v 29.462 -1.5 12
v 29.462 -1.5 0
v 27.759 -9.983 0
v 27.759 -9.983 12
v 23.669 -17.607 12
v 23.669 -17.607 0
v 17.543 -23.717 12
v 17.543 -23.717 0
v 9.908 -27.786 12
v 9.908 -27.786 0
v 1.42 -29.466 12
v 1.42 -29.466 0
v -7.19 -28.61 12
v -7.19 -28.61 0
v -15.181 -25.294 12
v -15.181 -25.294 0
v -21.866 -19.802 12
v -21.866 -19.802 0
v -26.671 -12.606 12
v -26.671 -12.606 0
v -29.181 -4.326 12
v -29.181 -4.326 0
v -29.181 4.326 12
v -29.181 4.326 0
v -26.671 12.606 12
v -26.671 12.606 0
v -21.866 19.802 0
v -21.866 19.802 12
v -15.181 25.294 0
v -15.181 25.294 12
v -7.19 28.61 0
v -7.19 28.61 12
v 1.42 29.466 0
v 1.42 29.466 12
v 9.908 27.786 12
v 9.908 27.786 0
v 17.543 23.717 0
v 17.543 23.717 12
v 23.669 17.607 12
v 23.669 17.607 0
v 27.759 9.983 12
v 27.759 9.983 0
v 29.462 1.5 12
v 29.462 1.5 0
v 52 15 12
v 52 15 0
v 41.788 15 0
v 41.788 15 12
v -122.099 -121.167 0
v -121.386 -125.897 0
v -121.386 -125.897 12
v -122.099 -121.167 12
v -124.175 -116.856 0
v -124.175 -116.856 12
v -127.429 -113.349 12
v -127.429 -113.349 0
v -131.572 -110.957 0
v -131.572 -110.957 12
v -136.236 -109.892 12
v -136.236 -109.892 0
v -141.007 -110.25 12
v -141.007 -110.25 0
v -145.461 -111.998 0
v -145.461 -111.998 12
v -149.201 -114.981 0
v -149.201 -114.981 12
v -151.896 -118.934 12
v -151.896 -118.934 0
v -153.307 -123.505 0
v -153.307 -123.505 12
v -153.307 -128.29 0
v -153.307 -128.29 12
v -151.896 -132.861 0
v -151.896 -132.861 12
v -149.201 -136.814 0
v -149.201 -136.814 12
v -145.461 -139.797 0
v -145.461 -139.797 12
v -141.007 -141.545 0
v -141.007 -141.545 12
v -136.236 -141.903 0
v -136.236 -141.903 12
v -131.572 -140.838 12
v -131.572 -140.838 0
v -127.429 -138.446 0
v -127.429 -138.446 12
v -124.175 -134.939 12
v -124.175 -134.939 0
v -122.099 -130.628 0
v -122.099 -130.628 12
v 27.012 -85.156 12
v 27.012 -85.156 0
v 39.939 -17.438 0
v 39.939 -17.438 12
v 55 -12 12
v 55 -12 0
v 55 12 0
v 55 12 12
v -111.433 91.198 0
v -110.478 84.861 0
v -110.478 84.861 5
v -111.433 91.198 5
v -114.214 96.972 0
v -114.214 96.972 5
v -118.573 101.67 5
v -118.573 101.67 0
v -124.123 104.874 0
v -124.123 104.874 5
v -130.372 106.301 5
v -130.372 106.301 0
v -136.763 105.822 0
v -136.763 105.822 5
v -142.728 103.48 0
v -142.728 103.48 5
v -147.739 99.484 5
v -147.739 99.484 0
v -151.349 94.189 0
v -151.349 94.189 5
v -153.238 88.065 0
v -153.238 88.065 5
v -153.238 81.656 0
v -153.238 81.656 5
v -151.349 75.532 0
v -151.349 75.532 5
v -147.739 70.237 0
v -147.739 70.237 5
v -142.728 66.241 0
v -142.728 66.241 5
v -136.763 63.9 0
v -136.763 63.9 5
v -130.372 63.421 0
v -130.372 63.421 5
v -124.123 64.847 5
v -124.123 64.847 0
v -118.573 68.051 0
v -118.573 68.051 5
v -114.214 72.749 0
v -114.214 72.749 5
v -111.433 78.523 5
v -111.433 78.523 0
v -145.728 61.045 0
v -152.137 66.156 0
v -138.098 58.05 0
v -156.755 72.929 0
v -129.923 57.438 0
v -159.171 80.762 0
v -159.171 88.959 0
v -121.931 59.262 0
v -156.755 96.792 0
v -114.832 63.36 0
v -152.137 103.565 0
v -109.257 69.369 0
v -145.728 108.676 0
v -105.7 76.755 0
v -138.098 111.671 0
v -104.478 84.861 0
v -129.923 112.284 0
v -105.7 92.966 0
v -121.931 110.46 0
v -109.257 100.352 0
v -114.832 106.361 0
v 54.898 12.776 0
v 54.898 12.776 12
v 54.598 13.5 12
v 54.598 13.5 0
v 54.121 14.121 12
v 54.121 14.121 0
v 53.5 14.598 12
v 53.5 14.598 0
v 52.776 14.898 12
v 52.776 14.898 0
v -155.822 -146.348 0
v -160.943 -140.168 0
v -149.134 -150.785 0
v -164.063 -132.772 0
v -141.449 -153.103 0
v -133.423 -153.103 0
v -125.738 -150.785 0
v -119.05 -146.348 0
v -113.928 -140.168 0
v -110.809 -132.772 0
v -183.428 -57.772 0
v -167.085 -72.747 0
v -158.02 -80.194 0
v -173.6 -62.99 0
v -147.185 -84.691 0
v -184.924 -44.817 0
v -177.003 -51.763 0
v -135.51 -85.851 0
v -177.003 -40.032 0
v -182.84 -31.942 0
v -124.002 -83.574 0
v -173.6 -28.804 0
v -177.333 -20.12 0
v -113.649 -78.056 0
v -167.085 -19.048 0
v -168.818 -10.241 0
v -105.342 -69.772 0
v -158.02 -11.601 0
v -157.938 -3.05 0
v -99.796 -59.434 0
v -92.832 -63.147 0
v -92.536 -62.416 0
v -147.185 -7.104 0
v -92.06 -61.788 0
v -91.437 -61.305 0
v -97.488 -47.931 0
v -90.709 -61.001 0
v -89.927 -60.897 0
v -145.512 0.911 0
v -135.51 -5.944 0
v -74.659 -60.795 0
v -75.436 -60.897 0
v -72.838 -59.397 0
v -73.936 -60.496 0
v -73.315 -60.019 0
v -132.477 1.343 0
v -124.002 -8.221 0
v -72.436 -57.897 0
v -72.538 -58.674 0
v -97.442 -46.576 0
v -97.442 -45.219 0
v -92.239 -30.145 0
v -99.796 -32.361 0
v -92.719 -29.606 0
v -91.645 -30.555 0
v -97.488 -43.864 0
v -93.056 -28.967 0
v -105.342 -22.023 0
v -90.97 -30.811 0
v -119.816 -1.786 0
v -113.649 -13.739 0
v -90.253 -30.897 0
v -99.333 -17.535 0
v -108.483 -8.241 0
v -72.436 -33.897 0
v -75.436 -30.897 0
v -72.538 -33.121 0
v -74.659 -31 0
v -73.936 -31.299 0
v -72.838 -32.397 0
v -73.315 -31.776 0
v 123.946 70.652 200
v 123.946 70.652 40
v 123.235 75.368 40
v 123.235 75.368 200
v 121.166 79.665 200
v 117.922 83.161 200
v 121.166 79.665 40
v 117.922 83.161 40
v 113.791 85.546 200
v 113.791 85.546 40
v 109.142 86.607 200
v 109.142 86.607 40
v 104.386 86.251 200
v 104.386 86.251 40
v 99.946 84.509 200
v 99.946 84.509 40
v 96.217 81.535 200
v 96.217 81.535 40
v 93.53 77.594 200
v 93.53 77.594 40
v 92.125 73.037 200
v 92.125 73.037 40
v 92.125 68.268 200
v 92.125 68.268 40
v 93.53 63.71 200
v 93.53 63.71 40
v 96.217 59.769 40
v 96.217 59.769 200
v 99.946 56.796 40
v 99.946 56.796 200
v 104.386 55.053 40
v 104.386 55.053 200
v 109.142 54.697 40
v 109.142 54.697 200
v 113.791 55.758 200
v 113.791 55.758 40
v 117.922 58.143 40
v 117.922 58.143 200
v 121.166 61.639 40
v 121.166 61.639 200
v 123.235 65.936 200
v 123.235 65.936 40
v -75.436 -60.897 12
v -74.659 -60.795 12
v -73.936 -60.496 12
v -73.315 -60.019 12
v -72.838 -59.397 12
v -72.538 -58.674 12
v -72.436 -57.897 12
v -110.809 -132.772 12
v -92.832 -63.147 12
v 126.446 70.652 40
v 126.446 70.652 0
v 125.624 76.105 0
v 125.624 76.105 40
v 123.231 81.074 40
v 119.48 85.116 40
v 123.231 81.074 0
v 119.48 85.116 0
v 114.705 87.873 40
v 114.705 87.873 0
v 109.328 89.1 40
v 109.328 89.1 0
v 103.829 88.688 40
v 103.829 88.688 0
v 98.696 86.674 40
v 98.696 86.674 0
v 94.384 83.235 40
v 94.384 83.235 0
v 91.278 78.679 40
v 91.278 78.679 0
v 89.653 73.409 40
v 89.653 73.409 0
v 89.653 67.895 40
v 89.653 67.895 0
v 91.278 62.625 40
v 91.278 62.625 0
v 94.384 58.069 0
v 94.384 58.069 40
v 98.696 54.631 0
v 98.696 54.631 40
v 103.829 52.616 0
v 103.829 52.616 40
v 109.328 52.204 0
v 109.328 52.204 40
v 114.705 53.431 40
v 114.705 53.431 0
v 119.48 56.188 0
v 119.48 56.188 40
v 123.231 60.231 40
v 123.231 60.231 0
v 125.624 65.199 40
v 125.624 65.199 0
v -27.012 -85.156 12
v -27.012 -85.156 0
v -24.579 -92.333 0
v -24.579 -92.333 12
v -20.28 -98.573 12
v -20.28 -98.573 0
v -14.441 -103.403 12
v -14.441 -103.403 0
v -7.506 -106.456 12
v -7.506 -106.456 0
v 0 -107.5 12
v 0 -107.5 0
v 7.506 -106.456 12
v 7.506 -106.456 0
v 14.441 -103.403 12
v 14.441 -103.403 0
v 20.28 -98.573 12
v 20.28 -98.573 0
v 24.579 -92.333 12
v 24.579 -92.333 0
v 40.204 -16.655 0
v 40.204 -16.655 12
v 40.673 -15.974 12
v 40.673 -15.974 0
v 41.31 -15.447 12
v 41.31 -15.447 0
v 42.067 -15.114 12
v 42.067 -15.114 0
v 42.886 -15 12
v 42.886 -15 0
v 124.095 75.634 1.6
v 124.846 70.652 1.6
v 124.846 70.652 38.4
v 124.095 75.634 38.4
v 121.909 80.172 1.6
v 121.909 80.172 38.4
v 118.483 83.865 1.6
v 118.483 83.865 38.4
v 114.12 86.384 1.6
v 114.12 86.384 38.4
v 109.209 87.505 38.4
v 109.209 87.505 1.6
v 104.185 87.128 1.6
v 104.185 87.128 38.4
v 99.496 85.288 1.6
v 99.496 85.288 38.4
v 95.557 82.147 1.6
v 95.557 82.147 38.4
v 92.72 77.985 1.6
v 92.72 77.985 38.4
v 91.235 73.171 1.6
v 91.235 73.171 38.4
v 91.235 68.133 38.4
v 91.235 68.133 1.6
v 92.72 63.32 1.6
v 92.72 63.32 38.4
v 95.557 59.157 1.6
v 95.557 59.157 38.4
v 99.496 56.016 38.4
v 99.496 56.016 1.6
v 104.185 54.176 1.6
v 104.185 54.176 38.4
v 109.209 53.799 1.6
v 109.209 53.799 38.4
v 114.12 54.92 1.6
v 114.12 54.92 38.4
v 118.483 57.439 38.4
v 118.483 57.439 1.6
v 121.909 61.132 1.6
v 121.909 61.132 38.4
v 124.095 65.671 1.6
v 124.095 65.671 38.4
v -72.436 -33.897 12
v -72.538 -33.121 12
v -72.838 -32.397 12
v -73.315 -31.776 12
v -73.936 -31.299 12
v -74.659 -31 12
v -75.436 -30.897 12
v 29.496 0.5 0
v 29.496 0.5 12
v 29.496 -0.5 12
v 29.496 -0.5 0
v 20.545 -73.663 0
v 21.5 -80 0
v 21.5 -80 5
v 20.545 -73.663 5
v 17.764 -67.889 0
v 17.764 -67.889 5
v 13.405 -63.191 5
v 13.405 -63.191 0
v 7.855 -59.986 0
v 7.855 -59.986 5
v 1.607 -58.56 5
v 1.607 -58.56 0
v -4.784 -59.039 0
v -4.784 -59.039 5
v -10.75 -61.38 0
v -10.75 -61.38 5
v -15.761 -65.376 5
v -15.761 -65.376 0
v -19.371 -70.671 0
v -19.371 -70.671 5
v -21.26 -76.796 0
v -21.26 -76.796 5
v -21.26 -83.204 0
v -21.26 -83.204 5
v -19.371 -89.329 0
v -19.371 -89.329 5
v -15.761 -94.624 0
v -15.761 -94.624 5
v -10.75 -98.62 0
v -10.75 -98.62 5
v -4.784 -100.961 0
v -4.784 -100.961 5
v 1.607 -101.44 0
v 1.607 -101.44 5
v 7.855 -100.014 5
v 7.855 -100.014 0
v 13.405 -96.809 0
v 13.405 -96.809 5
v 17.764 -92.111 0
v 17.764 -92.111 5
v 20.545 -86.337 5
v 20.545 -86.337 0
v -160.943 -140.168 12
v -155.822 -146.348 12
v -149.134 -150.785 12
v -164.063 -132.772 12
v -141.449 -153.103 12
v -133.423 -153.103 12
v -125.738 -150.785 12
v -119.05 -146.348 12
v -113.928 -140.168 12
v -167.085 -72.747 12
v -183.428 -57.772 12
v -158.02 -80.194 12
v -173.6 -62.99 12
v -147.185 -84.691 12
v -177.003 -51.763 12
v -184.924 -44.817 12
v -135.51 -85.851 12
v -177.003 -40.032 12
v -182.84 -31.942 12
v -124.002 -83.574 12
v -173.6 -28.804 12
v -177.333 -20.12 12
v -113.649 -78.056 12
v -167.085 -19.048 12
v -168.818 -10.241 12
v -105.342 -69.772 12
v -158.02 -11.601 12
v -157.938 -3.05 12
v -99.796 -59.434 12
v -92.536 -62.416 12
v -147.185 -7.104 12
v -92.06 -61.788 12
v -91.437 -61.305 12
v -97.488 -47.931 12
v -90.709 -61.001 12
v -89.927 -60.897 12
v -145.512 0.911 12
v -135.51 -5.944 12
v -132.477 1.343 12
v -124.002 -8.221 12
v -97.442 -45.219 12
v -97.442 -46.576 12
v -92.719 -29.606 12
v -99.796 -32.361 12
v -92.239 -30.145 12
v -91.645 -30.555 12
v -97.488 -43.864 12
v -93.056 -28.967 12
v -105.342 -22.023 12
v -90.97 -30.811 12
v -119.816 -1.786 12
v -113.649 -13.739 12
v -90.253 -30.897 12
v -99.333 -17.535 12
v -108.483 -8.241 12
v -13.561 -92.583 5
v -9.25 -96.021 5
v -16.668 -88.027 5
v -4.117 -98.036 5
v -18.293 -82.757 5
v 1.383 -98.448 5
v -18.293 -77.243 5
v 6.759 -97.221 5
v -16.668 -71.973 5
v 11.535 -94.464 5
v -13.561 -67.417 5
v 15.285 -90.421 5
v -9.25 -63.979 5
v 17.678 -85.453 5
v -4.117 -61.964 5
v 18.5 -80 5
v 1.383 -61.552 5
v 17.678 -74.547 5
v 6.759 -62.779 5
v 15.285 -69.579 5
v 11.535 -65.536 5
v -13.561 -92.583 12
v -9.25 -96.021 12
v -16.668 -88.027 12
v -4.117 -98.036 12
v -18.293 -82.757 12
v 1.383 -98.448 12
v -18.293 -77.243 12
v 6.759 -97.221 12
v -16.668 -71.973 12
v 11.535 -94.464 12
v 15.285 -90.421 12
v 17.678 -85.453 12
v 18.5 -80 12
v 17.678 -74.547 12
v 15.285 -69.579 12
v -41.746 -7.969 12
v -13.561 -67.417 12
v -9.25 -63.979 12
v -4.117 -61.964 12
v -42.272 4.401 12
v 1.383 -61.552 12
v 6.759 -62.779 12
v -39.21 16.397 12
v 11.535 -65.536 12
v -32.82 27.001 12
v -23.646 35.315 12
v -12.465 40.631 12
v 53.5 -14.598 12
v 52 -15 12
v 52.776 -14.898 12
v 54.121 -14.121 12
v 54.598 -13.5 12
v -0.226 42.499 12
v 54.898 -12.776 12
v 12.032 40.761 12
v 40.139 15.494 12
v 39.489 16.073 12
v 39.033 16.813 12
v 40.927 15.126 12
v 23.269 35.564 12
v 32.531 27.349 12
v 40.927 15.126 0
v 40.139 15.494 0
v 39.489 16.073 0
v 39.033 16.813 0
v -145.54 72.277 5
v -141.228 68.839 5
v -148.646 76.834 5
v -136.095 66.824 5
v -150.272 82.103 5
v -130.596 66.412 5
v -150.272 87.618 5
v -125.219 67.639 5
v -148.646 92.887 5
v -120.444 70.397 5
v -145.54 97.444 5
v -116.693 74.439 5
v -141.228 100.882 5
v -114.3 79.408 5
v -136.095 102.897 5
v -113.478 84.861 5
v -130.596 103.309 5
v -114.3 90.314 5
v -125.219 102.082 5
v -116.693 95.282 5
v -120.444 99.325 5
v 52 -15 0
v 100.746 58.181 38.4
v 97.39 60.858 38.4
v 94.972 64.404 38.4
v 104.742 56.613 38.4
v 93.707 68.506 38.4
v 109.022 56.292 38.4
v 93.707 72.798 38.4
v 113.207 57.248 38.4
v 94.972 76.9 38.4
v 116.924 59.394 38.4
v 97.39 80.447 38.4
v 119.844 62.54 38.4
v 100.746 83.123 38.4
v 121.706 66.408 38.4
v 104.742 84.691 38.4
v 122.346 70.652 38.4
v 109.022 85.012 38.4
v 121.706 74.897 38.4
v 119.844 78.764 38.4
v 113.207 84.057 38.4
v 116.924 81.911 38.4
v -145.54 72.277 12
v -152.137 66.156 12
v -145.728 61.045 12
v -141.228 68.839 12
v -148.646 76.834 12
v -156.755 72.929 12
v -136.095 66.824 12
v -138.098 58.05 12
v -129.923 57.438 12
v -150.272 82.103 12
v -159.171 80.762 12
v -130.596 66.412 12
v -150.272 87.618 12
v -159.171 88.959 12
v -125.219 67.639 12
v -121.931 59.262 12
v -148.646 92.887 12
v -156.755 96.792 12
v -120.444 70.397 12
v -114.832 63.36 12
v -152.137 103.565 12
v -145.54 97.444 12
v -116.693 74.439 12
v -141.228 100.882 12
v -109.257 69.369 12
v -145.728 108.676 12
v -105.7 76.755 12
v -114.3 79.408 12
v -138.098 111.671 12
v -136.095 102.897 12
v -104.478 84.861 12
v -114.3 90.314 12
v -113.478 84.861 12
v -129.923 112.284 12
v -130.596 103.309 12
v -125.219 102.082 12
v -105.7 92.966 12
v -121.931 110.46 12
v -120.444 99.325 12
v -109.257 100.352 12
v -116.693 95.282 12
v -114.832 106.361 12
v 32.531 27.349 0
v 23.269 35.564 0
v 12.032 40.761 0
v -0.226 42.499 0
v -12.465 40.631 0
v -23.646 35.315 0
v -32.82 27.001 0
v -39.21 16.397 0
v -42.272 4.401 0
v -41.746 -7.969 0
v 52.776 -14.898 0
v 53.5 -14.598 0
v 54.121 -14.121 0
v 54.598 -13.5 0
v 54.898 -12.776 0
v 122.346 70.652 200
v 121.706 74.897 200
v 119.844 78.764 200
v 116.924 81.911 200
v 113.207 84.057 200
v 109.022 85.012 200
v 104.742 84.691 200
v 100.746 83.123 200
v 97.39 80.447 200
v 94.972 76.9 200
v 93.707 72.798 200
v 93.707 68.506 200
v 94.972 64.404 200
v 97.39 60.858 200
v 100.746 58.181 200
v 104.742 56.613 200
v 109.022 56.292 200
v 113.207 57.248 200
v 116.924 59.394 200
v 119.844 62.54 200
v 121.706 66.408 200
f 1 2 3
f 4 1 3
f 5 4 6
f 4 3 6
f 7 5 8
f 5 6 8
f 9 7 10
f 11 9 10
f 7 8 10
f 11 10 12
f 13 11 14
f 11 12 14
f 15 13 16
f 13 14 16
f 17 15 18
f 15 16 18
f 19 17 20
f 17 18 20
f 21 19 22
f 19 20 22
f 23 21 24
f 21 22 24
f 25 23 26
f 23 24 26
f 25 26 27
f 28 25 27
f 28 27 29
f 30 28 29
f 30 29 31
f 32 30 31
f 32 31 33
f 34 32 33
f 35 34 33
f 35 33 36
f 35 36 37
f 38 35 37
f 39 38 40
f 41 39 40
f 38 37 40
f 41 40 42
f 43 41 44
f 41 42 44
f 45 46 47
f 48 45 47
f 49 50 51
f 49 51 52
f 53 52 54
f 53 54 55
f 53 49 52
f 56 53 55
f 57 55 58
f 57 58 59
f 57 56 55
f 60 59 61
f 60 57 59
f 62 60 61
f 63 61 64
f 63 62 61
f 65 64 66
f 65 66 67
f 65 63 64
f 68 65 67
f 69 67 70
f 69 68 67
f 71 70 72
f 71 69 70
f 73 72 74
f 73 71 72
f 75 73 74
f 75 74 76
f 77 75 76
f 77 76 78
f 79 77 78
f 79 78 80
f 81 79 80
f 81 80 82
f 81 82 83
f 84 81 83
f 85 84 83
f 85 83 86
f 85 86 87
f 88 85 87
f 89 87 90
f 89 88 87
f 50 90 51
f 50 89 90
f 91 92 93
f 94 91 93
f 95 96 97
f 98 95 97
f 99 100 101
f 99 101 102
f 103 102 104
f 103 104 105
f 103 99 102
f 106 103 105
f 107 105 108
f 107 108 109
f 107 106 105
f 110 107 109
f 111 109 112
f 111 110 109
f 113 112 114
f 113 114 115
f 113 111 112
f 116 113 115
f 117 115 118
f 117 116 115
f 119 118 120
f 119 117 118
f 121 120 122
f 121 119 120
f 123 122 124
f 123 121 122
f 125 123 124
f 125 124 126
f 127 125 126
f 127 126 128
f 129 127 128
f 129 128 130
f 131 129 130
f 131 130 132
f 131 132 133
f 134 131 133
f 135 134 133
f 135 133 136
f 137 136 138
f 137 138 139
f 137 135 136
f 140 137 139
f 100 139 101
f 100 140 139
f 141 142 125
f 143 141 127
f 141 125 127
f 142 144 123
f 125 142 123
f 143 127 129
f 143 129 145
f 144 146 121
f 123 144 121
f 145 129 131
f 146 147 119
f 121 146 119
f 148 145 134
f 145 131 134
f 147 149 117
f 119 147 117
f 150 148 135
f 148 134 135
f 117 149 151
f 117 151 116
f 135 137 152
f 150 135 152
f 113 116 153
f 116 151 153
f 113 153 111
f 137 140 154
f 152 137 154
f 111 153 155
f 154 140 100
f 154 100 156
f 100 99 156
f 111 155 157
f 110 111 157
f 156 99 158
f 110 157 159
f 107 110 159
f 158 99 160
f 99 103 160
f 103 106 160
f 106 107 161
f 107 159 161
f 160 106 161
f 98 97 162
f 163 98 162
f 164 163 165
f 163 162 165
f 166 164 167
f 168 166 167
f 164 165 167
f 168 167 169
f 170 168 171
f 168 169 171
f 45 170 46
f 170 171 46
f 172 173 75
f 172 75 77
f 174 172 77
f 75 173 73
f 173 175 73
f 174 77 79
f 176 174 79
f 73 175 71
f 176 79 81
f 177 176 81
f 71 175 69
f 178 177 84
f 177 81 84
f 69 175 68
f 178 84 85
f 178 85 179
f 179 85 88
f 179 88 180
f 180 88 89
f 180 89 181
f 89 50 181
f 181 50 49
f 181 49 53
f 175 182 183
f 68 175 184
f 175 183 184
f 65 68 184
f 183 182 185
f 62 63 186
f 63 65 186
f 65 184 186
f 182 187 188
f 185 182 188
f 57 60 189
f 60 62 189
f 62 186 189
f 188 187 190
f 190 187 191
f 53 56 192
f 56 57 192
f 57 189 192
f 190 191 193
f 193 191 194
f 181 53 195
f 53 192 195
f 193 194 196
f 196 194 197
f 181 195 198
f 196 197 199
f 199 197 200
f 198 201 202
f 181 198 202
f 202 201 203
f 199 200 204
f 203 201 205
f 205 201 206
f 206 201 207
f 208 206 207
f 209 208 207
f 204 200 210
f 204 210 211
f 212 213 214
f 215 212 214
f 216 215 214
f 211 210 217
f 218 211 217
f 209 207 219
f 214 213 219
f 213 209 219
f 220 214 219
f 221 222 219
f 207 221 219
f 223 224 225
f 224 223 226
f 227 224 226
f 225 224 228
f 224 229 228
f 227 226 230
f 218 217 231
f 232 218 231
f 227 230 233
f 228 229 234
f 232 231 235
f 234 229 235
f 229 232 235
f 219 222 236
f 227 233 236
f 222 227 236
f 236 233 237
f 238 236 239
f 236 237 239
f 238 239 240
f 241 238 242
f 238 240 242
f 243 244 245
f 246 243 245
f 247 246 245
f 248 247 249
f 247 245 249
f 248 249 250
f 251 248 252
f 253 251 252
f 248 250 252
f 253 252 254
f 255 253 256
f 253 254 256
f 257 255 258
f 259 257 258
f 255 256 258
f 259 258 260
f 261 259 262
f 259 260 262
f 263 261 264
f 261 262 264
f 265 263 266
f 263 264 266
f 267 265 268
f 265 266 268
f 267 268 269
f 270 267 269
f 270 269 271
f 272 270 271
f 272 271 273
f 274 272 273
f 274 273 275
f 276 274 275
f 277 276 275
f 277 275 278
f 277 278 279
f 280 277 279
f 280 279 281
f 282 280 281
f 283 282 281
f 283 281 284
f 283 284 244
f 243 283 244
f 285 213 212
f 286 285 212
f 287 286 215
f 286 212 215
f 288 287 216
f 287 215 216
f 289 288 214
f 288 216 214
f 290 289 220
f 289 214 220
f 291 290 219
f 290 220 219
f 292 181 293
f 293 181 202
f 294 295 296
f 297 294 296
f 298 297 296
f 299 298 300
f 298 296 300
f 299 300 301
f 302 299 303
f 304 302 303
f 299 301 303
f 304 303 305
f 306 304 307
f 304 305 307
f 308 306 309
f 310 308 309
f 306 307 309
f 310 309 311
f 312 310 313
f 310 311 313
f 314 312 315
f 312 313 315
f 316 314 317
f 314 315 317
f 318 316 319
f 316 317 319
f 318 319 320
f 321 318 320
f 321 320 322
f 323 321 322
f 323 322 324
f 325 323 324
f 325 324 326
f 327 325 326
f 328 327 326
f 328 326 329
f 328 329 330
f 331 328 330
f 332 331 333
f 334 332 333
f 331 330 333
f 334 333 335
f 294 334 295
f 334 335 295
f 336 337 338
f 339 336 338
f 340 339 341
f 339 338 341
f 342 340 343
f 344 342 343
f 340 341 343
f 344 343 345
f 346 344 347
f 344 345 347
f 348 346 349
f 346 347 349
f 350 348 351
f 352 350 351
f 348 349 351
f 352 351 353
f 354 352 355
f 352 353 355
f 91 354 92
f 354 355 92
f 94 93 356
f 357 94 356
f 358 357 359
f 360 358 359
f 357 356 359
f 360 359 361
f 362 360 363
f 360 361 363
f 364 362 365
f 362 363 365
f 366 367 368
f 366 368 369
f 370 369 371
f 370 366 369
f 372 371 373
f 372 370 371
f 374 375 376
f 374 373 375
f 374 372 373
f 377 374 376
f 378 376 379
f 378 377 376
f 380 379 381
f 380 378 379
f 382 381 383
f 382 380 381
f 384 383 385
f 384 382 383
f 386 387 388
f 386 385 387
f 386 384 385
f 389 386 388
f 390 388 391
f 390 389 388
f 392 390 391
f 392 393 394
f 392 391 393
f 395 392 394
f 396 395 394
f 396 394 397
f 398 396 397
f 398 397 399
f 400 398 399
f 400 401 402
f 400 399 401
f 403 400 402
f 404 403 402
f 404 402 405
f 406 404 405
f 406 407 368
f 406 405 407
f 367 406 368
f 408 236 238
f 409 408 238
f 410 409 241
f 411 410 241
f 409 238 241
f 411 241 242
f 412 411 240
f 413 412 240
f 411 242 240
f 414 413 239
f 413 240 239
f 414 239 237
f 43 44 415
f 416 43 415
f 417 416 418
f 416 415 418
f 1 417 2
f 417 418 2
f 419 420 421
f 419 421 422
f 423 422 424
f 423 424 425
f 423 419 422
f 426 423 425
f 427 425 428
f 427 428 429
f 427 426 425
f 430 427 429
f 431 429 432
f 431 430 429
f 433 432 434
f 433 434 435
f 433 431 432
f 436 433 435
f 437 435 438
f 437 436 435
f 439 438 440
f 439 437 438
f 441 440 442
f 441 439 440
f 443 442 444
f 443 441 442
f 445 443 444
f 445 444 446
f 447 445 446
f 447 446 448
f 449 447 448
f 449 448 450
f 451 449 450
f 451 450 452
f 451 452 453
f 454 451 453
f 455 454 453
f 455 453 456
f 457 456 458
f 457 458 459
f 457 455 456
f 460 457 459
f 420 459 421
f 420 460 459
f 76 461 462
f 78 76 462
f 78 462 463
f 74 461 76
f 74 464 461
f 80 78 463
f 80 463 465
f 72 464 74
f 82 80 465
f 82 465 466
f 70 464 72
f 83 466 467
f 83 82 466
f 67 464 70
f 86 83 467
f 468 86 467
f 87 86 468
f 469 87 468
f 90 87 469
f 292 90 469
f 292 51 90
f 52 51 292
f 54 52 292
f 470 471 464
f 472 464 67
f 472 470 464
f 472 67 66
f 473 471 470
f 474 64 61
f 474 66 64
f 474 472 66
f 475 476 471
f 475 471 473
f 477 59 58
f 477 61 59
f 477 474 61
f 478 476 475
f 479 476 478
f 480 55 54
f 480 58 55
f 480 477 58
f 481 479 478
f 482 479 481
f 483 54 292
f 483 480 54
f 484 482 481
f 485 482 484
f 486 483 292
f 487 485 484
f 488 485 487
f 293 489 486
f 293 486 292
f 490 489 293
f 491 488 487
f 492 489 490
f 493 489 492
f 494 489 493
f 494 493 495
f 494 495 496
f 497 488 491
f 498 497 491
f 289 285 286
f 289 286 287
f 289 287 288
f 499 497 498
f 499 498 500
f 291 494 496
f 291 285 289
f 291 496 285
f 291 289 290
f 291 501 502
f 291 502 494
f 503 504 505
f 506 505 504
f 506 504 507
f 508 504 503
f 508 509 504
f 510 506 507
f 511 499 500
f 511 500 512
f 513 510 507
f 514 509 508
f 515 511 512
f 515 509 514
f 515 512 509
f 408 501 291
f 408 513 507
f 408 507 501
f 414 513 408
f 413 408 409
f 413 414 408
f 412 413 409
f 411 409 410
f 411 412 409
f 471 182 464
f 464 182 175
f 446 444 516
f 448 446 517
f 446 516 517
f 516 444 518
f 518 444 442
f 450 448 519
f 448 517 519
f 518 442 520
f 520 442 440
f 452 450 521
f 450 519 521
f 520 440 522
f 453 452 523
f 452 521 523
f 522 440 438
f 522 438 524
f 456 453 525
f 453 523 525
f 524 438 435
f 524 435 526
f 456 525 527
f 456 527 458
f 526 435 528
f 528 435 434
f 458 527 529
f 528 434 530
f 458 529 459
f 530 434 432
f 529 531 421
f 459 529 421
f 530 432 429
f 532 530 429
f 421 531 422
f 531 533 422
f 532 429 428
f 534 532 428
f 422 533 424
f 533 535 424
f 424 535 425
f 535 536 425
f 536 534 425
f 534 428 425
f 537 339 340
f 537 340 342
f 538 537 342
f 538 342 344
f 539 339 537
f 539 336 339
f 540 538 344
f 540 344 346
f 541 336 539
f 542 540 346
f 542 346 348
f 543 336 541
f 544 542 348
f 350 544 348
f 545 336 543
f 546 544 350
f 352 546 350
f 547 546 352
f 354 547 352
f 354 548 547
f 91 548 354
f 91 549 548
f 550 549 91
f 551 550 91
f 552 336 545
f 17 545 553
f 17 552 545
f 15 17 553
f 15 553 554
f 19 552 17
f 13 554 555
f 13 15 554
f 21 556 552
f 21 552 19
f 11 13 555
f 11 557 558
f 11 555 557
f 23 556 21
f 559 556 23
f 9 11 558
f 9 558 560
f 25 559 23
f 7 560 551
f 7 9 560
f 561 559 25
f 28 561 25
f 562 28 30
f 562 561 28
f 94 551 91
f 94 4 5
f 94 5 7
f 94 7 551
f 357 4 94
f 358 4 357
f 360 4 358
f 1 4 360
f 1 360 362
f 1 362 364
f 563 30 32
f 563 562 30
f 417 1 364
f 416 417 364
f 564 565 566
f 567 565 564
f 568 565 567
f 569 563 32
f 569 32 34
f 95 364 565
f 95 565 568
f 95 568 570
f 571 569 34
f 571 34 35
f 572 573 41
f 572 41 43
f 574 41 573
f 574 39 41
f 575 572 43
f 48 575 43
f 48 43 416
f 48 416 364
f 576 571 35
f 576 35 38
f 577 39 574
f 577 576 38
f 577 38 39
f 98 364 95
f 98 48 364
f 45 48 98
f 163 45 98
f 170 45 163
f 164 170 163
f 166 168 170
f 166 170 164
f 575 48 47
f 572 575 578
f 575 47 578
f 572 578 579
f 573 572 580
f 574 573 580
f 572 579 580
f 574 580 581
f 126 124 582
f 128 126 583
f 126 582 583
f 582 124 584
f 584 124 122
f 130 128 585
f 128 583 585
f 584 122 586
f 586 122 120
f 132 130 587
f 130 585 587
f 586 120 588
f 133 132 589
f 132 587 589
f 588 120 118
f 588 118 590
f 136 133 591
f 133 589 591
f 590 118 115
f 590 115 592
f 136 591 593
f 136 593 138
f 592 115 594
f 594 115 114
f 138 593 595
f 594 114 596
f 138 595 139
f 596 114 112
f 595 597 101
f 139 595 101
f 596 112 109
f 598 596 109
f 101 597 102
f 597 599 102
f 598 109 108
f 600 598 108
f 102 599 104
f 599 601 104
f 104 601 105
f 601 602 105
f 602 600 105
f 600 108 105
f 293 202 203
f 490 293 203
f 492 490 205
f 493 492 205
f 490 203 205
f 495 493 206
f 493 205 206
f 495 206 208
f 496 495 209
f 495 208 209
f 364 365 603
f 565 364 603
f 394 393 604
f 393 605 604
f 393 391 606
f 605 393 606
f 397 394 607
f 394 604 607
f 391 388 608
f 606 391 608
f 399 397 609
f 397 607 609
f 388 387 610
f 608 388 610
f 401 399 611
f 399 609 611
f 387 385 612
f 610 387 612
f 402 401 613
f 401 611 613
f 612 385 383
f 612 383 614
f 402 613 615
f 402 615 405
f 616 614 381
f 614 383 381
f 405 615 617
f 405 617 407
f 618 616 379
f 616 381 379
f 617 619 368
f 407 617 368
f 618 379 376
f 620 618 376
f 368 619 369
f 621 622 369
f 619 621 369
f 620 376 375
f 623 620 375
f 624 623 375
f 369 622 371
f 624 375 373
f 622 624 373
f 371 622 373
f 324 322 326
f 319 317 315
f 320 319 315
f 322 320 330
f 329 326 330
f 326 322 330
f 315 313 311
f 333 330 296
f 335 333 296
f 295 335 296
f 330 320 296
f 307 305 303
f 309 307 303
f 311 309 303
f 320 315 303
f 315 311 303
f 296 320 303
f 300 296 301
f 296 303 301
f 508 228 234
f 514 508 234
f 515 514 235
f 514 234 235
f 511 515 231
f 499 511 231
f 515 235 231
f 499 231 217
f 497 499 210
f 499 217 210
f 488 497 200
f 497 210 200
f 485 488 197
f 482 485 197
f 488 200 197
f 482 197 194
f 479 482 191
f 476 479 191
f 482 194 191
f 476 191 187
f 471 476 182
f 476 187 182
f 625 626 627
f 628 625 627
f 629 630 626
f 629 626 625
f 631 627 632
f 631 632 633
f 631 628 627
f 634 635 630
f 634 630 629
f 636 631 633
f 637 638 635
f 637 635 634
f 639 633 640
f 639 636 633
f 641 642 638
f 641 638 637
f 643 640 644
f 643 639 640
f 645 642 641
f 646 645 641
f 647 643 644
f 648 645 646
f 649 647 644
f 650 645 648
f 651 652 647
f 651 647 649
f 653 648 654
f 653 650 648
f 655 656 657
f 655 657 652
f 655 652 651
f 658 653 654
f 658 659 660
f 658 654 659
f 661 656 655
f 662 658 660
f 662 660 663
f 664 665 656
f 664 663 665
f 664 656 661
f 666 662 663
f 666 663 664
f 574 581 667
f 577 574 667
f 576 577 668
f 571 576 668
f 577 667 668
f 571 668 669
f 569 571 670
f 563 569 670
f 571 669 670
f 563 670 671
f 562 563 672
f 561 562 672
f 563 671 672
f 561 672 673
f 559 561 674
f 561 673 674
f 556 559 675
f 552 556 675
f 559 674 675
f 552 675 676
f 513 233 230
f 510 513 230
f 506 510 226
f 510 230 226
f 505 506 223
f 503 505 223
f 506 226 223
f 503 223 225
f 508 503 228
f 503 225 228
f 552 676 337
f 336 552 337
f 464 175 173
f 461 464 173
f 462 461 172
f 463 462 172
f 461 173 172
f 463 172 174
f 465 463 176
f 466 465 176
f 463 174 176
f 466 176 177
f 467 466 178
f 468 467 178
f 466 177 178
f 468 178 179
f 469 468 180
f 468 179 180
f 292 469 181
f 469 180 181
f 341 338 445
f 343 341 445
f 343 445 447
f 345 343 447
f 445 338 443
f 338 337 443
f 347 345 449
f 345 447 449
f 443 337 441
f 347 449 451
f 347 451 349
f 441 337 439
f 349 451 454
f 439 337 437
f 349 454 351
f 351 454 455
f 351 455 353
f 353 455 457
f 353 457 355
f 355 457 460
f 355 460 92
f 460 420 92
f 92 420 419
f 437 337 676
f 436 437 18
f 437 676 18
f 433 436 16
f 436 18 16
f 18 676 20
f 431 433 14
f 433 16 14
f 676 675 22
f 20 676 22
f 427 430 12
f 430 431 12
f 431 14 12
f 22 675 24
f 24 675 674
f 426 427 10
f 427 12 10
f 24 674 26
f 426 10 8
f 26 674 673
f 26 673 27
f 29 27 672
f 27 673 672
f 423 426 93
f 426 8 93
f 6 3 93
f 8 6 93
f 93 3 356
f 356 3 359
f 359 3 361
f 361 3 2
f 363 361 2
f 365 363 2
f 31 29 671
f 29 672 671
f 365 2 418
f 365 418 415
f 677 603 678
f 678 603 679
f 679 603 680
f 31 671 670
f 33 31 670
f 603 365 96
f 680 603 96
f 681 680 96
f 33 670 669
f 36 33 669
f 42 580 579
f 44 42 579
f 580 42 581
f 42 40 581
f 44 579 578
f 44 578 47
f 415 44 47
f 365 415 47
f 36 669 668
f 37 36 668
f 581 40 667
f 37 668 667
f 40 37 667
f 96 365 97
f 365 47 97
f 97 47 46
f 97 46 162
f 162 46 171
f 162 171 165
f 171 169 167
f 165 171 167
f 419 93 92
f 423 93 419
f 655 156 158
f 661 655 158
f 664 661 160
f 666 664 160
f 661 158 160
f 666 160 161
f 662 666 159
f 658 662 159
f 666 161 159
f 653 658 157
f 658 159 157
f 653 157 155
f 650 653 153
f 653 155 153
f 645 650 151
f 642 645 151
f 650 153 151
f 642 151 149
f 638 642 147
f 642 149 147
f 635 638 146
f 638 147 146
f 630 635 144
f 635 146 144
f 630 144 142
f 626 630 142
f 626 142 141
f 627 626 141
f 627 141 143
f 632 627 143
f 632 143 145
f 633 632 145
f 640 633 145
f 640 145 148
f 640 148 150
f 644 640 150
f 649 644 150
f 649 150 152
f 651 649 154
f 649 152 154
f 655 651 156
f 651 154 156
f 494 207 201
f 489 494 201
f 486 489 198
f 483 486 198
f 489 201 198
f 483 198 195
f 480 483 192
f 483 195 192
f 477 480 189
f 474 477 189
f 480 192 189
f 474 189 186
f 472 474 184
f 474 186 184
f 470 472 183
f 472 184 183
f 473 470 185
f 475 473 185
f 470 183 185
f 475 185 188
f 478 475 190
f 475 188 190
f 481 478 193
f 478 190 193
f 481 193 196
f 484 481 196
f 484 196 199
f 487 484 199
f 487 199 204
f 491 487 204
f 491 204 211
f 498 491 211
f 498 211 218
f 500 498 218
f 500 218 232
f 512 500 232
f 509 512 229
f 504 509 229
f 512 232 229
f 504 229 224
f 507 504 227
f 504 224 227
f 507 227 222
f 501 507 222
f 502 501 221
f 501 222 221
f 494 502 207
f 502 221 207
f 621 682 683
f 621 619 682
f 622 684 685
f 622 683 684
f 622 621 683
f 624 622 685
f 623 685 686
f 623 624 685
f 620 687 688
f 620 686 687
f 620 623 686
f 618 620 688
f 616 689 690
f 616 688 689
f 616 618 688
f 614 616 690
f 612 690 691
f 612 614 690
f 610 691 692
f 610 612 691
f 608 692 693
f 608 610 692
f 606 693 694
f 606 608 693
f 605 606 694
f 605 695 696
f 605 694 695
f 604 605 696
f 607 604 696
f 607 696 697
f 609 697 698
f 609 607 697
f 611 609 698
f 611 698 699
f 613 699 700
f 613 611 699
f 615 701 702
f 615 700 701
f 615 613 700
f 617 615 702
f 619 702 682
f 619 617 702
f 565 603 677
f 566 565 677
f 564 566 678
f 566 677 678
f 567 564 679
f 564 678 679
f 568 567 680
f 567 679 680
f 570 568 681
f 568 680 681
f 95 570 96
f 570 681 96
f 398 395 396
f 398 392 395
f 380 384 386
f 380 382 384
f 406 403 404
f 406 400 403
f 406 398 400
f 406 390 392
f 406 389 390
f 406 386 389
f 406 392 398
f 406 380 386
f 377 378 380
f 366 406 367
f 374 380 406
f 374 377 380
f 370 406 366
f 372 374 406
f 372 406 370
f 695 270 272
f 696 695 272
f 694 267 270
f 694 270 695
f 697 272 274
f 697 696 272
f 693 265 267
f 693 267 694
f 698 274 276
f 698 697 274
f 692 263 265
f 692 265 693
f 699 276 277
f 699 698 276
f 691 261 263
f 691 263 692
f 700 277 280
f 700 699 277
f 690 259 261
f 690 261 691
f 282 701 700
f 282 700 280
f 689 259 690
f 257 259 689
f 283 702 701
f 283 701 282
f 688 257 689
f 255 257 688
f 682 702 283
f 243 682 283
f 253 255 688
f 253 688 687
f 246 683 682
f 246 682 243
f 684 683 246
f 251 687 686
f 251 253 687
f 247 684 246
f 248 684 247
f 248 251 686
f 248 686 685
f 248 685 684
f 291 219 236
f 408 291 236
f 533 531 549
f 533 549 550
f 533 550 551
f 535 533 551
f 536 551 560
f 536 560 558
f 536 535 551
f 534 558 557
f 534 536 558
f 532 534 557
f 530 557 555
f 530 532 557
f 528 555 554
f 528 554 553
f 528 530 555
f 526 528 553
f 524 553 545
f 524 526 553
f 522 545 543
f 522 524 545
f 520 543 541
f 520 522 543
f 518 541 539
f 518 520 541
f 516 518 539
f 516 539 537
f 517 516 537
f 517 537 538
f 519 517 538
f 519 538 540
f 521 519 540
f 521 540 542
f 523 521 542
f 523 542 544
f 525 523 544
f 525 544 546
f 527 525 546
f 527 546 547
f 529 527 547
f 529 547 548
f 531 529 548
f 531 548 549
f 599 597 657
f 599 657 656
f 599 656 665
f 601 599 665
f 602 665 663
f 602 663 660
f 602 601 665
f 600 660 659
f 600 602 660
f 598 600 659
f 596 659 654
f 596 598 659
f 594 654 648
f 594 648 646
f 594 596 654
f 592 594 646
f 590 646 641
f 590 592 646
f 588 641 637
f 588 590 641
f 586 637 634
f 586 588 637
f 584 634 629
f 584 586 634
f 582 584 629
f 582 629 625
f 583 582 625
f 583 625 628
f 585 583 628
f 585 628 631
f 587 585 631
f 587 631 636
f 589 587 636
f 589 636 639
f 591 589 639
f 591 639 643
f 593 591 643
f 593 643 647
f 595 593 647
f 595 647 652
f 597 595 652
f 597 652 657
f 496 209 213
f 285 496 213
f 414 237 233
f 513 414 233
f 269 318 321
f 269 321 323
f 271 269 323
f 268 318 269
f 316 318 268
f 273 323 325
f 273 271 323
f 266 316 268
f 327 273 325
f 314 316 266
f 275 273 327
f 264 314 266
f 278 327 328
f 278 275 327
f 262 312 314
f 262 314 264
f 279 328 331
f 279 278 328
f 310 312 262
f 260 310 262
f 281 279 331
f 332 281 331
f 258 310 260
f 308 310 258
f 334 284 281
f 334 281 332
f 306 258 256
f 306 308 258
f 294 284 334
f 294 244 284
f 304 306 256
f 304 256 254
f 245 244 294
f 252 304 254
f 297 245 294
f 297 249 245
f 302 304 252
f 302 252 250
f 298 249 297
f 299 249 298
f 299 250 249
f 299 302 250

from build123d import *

# Parameters (mm, degrees)
F0_R     = 21.5
F0_R_2   = 18.5
F1_DEPTH = 12
F0_R_3   = 16.05
F0_R_4   = 27.5
F0_R_5   = 16
F2_DEPTH = 200
F3_DEPTH = 40
F4_DEPTH = 5
F5_DEPTH = 5
F6_T     = -1.6


with BuildPart() as f1:
    # F0 (on Top) → F1 (new body)
    with BuildSketch(Plane.XY):
        with BuildLine():
            ThreePointArc((41.7881562168, 15), (40.1389805986, 15.4939633322), (39.0328931695, 16.8131868132))
            ThreePointArc((39.0328931695, 16.8131868132), (-12.4650177872, 40.6309405695), (-41.7462456209, -7.96875))
            Line((-41.7462456209, -7.96875), (-27.0122765782, -85.15625))
            ThreePointArc((-27.0122765782, -85.15625), (0, -107.5), (27.0122765782, -85.15625))
            Line((27.0122765782, -85.15625), (39.938799216, -17.4375))
            ThreePointArc((39.938799216, -17.4375), (40.973460707, -15.6883447489), (42.8855930246, -15))
            Line((42.8855930246, -15), (52, -15))
            ThreePointArc((52, -15), (54.1213203436, -14.1213203436), (55, -12))
            Line((55, -12), (55, -1.5))
            Line((55, -1.5), (55, 1.5))
            Line((55, 1.5), (55, 12))
            ThreePointArc((55, 12), (54.1213203436, 14.1213203436), (52, 15))
            Line((52, 15), (41.7881562168, 15))
        make_face()
        with Locations((0, -80)):
            Circle(F0_R, mode=Mode.SUBTRACT)
        with BuildLine():
            ThreePointArc((29.4618397253, -1.5), (-29.5, 0), (29.4618397253, 1.5))
            ThreePointArc((29.4618397253, 1.5), (29.5, 0), (29.4618397253, -1.5))
        make_face(mode=Mode.SUBTRACT)
        with Locations((0, -80)):
            Circle(F0_R)
        with Locations((0, -80)):
            Circle(F0_R_2, mode=Mode.SUBTRACT)
    extrude(amount=F1_DEPTH)

    # F0 (on Top) → F4 (cut)
    with BuildSketch(Plane.XY):
        with Locations((0, -80)):
            Circle(F0_R)
        with Locations((0, -80)):
            Circle(F0_R_2, mode=Mode.SUBTRACT)
    extrude(amount=F4_DEPTH, mode=Mode.SUBTRACT)


with BuildPart() as f1b:
    # F0 (on Top) → F1, piece 2 (new body)
    with BuildSketch(Plane.XY):
        with BuildLine():
            ThreePointArc((-90.2527075587, -30.8974491381), (-91.9544829857, -30.3680685738), (-93.0556671888, -28.9667560688))
            ThreePointArc((-93.0556671888, -28.9667560688), (-151.8612281468, -0.640860753), (-183.4275385683, -57.7724491381))
            Line((-183.4275385683, -57.7724491381), (-164.0626218372, -132.7724491381))
            ThreePointArc((-164.0626218372, -132.7724491381), (-137.4358613321, -153.3974491381), (-110.8091008269, -132.7724491381))
            Line((-110.8091008269, -132.7724491381), (-92.8320031282, -63.1474491381))
            ThreePointArc((-92.8320031282, -63.1474491381), (-91.7643829257, -61.525740893), (-89.9272656186, -60.8974491381))
            Line((-89.9272656186, -60.8974491381), (-75.4358613321, -60.8974491381))
            ThreePointArc((-75.4358613321, -60.8974491381), (-73.3145409885, -60.0187694817), (-72.4358613321, -57.8974491381))
            Line((-72.4358613321, -57.8974491381), (-72.4358613321, -47.3974491381))
            Line((-72.4358613321, -47.3974491381), (-72.4358613321, -44.3974491381))
            Line((-72.4358613321, -44.3974491381), (-72.4358613321, -33.8974491381))
            ThreePointArc((-72.4358613321, -33.8974491381), (-73.3145409885, -31.7761287946), (-75.4358613321, -30.8974491381))
            Line((-75.4358613321, -30.8974491381), (-90.2527075587, -30.8974491381))
        make_face()
        with Locations((-137.4358613321, -125.8974491381)):
            Circle(F0_R_3, mode=Mode.SUBTRACT)
        with BuildLine():
            ThreePointArc((-97.4876040774, -47.9313474432), (-177.4358613321, -45.8974491381), (-97.4876040774, -43.8635508331))
            ThreePointArc((-97.4876040774, -43.8635508331), (-97.4358613321, -45.8974491381), (-97.4876040774, -47.9313474432))
        make_face(mode=Mode.SUBTRACT)
    extrude(amount=F1_DEPTH)


with BuildPart() as f1c:
    # F0 (on Top) → F1, piece 3 (new body)
    with BuildSketch(Plane.XY):
        with Locations((-131.978303194, 84.8606303334)):
            Circle(F0_R_4)
        with Locations((-131.978303194, 84.8606303334)):
            Circle(F0_R, mode=Mode.SUBTRACT)
        with Locations((-131.978303194, 84.8606303334)):
            Circle(F0_R)
        with Locations((-131.978303194, 84.8606303334)):
            Circle(F0_R_2, mode=Mode.SUBTRACT)
    extrude(amount=F1_DEPTH)

    # F0 (on Top) → F5 (cut)
    with BuildSketch(Plane.XY):
        with Locations((-131.978303194, 84.8606303334)):
            Circle(F0_R)
        with Locations((-131.978303194, 84.8606303334)):
            Circle(F0_R_2, mode=Mode.SUBTRACT)
    extrude(amount=F5_DEPTH, mode=Mode.SUBTRACT)


with BuildPart() as f2:
    # F0 (on Top) → F2 (new body)
    with BuildSketch(Plane.XY):
        with Locations((107.9458966851, 70.6521868706)):
            Circle(F0_R_5)
    extrude(amount=F2_DEPTH)

    # F0 (on Top) → F3 (join)
    with BuildSketch(Plane.XY):
        with Locations((107.9458966851, 70.6521868706)):
            Circle(F0_R_2)
        with Locations((107.9458966851, 70.6521868706)):
            Circle(F0_R_5, mode=Mode.SUBTRACT)
    extrude(amount=F3_DEPTH)

    # F6
    f6_openings = [f2.faces().sort_by_distance(p)[0] for p in [
        (107.945897, 70.652187, 200),
    ]]
    offset(amount=F6_T, openings=f6_openings, kind=Kind.INTERSECTION)


solid = Compound([f1.part, f1b.part, f1c.part, f2.part])
